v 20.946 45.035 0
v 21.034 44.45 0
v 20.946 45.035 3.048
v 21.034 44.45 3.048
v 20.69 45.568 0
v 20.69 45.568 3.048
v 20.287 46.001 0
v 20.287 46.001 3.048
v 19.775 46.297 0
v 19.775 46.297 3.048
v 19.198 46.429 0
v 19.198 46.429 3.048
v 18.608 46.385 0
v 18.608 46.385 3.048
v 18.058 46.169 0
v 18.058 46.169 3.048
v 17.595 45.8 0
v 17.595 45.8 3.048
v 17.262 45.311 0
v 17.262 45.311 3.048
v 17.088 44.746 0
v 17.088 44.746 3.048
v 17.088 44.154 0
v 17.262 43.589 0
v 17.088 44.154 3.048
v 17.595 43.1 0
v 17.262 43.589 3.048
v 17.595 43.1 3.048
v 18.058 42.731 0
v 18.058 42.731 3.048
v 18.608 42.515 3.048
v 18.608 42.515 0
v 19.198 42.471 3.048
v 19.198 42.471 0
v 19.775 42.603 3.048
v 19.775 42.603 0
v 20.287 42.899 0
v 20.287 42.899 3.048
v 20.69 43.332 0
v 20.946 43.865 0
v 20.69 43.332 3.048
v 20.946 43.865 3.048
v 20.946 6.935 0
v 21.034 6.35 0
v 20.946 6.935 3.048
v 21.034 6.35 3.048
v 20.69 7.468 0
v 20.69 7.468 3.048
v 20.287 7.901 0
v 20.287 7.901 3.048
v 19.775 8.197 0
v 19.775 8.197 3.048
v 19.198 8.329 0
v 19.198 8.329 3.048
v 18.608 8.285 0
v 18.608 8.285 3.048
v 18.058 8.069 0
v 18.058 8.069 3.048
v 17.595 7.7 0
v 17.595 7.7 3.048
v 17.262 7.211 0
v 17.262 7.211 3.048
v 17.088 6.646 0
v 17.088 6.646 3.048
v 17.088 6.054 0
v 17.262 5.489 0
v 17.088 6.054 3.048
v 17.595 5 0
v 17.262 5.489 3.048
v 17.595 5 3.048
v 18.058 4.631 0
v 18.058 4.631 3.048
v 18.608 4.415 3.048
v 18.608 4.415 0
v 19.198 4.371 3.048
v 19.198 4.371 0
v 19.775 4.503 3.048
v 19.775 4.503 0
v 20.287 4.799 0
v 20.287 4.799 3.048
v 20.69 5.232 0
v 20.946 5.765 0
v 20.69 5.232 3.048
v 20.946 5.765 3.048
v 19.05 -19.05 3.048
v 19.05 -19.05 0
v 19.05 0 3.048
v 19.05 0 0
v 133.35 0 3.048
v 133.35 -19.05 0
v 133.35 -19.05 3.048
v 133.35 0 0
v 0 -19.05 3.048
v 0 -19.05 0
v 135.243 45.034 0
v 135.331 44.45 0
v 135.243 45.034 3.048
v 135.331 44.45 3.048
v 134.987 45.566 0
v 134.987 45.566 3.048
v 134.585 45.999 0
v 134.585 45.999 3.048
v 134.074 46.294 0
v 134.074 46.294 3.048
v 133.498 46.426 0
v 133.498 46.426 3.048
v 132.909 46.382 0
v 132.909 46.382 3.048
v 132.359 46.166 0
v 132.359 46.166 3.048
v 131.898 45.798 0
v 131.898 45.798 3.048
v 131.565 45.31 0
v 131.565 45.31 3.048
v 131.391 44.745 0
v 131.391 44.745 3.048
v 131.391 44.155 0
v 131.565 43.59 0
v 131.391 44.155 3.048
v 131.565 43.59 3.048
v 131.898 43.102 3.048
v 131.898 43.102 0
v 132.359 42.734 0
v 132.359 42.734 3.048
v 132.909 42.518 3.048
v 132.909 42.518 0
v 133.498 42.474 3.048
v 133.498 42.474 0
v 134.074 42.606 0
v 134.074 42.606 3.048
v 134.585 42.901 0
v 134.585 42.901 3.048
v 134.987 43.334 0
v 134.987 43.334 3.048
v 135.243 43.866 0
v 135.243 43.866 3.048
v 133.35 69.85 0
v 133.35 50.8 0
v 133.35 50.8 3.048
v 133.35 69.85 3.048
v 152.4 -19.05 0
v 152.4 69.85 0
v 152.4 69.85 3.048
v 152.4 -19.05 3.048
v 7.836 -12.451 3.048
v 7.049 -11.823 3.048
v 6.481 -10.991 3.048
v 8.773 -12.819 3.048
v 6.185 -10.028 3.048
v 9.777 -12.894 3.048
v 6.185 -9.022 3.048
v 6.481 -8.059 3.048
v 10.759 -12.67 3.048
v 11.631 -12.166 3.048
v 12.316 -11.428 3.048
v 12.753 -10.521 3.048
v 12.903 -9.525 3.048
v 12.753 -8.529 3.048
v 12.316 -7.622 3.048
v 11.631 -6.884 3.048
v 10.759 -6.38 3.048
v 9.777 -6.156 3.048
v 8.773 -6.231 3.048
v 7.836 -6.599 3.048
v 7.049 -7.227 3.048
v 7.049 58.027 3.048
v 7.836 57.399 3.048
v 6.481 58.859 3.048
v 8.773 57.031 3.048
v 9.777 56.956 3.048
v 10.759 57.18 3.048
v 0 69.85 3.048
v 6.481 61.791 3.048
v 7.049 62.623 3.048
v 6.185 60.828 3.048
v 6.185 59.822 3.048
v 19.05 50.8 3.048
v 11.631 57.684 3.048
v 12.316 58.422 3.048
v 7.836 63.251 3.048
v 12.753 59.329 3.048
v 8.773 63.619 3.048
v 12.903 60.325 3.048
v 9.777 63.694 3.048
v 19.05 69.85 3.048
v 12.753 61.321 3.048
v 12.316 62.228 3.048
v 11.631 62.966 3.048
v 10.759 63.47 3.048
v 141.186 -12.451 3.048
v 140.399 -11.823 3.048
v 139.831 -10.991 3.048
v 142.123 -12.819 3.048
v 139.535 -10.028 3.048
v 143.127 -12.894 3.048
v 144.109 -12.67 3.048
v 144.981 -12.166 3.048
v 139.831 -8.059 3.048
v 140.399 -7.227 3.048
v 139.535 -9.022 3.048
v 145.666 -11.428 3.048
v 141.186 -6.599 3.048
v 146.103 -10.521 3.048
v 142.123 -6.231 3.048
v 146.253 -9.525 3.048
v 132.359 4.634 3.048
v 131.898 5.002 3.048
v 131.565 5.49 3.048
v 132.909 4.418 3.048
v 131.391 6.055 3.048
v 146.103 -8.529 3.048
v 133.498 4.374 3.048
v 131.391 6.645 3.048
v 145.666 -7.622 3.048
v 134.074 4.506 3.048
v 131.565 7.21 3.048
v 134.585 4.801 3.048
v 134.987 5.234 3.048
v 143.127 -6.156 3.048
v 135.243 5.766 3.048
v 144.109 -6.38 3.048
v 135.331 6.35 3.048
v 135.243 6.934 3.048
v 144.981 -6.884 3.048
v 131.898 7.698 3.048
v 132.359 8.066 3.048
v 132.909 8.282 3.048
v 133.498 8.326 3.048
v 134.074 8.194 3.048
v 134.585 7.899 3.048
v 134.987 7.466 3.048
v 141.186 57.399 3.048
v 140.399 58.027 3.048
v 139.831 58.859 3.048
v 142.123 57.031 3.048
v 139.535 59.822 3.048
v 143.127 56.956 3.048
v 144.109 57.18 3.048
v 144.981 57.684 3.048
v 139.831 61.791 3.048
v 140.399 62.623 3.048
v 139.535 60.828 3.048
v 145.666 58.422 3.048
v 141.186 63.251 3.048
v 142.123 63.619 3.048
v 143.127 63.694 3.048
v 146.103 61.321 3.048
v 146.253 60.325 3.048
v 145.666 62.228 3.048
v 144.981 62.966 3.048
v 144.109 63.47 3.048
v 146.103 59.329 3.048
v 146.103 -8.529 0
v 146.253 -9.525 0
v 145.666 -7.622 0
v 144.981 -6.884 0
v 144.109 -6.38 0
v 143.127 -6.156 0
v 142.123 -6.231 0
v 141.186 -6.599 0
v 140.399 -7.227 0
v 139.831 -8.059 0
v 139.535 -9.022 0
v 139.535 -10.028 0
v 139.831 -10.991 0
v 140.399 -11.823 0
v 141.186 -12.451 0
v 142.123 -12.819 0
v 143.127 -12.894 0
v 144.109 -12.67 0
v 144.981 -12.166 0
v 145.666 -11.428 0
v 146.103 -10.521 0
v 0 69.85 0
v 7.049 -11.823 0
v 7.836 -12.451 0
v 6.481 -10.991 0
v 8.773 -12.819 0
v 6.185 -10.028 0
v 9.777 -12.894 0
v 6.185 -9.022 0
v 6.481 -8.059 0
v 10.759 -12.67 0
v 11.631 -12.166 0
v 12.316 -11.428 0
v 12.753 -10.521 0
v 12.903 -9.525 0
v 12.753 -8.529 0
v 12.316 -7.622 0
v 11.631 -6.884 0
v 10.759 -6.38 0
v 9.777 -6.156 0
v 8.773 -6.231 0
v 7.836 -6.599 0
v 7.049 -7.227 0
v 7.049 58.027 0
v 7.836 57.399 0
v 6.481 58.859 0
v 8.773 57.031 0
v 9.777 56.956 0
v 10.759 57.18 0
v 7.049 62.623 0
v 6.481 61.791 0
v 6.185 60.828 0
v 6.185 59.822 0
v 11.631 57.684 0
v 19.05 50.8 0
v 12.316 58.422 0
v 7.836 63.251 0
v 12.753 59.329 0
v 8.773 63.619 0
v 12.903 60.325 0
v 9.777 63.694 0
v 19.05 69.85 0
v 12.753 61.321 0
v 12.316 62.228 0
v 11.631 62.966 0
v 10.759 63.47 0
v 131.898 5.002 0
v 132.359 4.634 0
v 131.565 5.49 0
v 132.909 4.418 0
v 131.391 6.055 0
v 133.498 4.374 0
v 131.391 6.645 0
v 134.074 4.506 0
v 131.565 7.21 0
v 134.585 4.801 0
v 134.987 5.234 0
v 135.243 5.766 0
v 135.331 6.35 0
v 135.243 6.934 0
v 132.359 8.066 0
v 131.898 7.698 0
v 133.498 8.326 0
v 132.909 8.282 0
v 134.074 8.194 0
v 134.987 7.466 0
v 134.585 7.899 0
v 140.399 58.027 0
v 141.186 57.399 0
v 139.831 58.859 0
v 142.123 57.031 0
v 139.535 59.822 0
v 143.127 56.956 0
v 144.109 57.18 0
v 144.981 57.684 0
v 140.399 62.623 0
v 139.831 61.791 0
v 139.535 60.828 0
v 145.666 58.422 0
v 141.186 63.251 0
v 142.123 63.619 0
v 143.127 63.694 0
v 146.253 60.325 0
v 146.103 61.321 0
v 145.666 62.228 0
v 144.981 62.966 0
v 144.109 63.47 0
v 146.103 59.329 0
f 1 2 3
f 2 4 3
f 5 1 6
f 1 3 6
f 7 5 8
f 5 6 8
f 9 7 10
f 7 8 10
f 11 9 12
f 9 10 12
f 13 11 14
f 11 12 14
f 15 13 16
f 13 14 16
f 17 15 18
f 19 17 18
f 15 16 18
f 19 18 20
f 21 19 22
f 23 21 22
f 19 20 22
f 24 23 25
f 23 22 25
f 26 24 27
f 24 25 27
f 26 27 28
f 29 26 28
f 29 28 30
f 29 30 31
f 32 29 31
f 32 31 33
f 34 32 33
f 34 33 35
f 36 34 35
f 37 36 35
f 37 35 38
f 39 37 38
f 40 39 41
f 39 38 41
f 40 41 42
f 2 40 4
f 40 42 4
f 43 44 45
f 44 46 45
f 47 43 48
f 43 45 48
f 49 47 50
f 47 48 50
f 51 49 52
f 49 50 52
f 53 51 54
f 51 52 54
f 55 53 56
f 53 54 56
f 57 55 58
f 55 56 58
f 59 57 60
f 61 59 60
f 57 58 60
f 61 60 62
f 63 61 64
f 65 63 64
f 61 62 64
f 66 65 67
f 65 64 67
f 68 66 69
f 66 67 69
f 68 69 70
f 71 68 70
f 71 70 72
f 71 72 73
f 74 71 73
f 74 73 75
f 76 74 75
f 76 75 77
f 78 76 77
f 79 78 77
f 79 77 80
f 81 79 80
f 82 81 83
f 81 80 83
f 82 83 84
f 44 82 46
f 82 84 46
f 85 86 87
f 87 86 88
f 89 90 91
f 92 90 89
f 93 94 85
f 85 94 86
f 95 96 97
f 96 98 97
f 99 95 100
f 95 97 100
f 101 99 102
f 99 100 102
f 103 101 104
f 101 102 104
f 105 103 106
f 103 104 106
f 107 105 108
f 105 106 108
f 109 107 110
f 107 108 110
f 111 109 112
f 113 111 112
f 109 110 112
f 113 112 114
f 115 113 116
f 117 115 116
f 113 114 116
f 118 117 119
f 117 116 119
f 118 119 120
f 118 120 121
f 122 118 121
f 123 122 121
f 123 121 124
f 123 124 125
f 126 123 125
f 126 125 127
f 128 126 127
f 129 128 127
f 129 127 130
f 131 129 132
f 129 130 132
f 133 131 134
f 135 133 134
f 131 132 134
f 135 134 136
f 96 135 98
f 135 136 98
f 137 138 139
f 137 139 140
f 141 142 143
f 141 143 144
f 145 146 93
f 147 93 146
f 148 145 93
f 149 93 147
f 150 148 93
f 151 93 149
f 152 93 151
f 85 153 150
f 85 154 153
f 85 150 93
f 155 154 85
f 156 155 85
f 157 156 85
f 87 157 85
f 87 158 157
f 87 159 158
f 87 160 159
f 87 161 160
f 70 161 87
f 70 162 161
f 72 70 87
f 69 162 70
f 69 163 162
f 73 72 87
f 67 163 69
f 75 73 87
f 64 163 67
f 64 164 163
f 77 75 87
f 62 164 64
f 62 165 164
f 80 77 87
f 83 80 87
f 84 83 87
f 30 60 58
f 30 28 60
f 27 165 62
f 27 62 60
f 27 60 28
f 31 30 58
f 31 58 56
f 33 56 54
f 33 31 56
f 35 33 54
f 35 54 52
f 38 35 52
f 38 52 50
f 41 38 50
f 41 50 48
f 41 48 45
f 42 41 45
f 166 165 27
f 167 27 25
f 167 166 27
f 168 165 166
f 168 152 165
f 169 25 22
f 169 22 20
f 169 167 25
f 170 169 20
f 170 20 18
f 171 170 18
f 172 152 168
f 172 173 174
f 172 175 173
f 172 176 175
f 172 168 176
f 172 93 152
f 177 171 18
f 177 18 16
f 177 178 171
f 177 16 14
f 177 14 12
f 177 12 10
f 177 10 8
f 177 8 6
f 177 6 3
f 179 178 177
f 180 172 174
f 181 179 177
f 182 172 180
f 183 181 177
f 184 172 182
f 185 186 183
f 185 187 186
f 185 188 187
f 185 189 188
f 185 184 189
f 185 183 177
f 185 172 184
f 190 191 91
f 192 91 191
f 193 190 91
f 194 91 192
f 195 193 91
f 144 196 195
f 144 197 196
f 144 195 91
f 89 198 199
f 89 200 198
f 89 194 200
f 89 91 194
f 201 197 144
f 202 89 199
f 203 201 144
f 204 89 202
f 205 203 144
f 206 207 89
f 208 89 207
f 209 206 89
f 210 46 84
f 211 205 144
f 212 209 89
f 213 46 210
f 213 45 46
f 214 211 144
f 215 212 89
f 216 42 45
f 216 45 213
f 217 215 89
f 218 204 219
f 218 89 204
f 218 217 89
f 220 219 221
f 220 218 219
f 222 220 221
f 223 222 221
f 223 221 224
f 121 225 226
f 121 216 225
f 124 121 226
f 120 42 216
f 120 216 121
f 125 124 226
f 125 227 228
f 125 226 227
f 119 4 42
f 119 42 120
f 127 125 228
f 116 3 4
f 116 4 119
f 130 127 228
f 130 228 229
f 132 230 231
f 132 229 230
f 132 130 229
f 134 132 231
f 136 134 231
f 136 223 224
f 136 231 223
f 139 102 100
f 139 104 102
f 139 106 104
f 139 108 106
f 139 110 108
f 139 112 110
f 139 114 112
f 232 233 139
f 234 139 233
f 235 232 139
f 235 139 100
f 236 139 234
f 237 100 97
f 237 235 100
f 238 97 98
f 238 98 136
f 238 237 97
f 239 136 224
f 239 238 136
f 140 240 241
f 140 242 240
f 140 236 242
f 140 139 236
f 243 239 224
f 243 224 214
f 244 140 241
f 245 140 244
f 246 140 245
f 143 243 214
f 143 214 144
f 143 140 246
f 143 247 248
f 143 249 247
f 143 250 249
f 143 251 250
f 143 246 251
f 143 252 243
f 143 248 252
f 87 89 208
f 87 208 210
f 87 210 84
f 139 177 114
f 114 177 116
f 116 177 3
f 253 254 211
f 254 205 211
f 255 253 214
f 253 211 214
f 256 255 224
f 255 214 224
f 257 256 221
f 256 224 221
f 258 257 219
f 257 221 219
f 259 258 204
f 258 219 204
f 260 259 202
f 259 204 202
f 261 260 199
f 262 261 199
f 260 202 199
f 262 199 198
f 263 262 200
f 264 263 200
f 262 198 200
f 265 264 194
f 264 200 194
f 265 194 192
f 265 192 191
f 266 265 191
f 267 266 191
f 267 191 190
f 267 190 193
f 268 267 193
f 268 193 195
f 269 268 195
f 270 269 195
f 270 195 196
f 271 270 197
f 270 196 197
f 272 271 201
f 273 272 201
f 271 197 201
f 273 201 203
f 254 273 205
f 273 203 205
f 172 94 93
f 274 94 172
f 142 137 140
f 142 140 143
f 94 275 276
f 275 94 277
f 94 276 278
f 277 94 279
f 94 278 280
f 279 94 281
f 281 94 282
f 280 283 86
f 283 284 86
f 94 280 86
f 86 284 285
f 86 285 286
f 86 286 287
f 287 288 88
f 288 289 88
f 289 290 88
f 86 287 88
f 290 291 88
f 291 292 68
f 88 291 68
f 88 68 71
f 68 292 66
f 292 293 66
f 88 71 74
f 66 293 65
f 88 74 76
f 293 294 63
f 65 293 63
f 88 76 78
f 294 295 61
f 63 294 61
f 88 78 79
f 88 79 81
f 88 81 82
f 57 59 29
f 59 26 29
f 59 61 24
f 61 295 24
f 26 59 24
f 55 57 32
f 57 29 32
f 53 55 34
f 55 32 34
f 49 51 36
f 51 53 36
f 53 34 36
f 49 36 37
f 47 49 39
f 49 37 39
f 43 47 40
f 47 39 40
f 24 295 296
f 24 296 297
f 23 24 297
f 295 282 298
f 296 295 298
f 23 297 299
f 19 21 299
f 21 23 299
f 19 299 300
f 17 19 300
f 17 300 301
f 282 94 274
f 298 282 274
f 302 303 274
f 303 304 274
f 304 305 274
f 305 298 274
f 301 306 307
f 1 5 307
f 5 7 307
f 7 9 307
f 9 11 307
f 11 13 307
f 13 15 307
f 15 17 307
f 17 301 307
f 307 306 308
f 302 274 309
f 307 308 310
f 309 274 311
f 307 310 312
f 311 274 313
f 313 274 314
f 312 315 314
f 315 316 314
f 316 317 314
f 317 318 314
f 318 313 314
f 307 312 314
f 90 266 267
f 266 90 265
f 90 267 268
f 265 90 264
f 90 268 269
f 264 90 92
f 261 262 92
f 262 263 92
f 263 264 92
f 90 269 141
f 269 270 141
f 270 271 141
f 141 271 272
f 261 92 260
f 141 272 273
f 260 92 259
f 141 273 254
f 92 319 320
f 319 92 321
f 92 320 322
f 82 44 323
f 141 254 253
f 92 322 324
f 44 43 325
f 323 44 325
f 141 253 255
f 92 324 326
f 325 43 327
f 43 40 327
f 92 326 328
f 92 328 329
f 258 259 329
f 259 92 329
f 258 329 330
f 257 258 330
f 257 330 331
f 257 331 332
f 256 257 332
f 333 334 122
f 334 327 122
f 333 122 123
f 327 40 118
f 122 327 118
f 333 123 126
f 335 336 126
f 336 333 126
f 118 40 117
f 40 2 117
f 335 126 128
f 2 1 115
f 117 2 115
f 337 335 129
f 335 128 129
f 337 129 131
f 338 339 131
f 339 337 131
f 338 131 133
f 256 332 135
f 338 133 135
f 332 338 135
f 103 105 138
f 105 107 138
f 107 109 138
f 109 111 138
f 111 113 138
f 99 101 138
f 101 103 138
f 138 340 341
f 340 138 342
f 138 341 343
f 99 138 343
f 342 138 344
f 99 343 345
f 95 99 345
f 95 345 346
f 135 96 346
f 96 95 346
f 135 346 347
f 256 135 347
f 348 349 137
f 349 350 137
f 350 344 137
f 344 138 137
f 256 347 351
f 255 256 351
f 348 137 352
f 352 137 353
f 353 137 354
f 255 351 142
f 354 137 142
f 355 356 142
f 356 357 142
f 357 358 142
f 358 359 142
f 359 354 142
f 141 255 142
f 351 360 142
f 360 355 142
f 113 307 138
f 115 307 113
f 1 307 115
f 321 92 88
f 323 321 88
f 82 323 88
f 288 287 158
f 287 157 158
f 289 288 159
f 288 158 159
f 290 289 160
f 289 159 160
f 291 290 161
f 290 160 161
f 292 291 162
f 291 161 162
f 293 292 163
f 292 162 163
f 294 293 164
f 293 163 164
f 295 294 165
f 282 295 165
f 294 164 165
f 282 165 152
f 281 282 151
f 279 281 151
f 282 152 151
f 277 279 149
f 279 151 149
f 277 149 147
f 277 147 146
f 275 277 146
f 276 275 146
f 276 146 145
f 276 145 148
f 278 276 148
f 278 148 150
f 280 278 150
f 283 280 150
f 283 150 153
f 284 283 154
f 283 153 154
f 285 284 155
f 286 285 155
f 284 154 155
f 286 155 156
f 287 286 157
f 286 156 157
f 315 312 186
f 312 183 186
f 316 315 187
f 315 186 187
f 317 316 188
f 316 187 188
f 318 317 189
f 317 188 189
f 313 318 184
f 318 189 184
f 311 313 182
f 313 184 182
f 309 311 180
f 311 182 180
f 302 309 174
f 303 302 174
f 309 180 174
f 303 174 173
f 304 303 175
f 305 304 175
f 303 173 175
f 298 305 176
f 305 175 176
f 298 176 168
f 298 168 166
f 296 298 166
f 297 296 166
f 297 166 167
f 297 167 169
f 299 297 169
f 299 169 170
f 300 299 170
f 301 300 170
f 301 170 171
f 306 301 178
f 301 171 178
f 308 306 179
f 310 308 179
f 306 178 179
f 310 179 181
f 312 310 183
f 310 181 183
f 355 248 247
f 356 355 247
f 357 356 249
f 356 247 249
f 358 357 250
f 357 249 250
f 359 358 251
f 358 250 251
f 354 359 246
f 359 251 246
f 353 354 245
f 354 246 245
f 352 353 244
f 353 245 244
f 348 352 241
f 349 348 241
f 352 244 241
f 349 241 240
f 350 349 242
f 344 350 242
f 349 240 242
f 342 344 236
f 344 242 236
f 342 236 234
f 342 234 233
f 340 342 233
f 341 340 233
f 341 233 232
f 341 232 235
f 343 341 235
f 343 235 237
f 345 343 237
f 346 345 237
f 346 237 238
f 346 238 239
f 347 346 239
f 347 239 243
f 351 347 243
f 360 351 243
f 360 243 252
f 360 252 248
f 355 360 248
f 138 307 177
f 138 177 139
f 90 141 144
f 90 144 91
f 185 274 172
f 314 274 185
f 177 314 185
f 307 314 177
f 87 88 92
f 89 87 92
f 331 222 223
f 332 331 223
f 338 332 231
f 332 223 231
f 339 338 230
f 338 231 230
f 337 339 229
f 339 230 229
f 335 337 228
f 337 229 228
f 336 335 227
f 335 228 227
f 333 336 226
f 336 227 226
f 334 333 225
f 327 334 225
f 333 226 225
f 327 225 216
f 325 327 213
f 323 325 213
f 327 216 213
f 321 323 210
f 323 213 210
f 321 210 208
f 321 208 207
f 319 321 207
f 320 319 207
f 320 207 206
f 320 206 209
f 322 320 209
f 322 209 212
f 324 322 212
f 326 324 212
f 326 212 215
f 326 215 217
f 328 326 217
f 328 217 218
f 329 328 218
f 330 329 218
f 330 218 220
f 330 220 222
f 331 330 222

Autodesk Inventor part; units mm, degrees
ref_plane "YZ Plane" through (0, 0, 0) normal (1, 0, 0) x (0, 1, 0)
ref_plane "XZ Plane" through (0, 0, 0) normal (0, 1, 0) x (-1, 0, 0)
ref_plane "XY Plane" through (0, 0, 0) normal (0, 0, 1) x (1, 0, 0)
sketch "Sketch1" plane through (0, 0, 0) normal (0, 0, 1) x (1, 0, 0)
  line L0 (0, 50.8) -> (0, 0)
  line L1 (152.4, 0) -> (152.4, 0)
  line L2 (19.05, 0) -> (133.35, 0)
  line L3 (152.4, 0) -> (152.4, 50.8)
  line L4 (19.05, 50.8) -> (133.35, 50.8)
  line L5 (0, 50.8) -> (0, 69.85)
  line L6 (0, 69.85) -> (19.05, 69.85)
  line L7 (19.05, 69.85) -> (19.05, 50.8)
  line L8 (0, 0) -> (0, -19.05)
  line L9 (0, -19.05) -> (19.05, -19.05)
  line L10 (19.05, -19.05) -> (19.05, 0)
  line L11 (133.35, 50.8) -> (133.35, 69.85)
  line L12 (133.35, 69.85) -> (152.4, 69.85)
  line L13 (152.4, 69.85) -> (152.4, 50.8)
  line L14 (152.4, 0) -> (152.4, -19.05)
  line L15 (152.4, -19.05) -> (133.35, -19.05)
  line L16 (133.35, -19.05) -> (133.35, 0)
  dimension "d23" = 50.8
  dimension "d26" = 152.4
  dimension "d77" = 19.05
  dimension "d78" = 19.05
  dimension "d79" = 19.05
  dimension "d81" = 19.05
  dimension "d82" = 19.05
  dimension "d83" = 19.05
  dimension "d84" = 19.05
extrude "Plate2" add sketch "Sketch1" along normal blind 3.048
sketch "Sketch8" plane through (0, 0, 3.048) normal (0, 0, 1) x (1, 0, 0)
  line L0 (133.35, 0) -> (19.05, 0) projected
  line L1 (19.05, 50.8) -> (19.05, 0)
  line L2 (19.05, 25.4) -> (19.05, 44.45)
  line L3 (19.05, 25.4) -> (19.05, 6.35)
  circle A0 centre (19.05, 44.45) radius 1.9844
  circle A1 centre (19.05, 6.35) radius 1.9844
  line L4 (152.4, 69.85) -> (152.4, -19.05) projected
  circle A2 centre (133.35, 44.45) radius 1.9812
  circle A3 centre (133.35, 6.35) radius 1.9812
  line L5 (19.05, -19.05) -> (0, -19.05) projected
  line L6 (19.05, 0) -> (19.05, -19.05) projected
  line L7 (133.35, -19.05) -> (133.35, 0) projected
  line L8 (152.4, -19.05) -> (133.35, -19.05) projected
  line L9 (133.35, 69.85) -> (152.4, 69.85) projected
  line L10 (19.05, 69.85) -> (19.05, 50.8) projected
  line L11 (0, 69.85) -> (19.05, 69.85) projected
  circle A4 centre (9.525, 60.325) radius 3.3782
  circle A5 centre (9.525, -9.525) radius 3.3782
  circle A6 centre (142.875, 60.325) radius 3.3782
  circle A7 centre (142.875, -9.525) radius 3.3782
  point P0 (0, 0)
  point P1 (152.4, 0)
  point P2 (152.4, 50.8)
  dimension "d63" = 19.05
  dimension "d64" = 19.05
  dimension "d65" = 3.9688
  dimension "d66" = 3.9688
  dimension "d69" = 3.9624
  dimension "d70" = 3.9624
  dimension "d71" = 19.05
  dimension "d72" = 38.1
  dimension "d73" = 19.05
  dimension "d74" = 6.35
  dimension "d85" = 6.7564
  dimension "d86" = 6.7564
  dimension "d87" = 9.525
  dimension "d88" = 9.525
  dimension "d89" = 9.525
  dimension "d90" = 9.525
  dimension "d92" = 6.7564
  dimension "d93" = 6.7564
  dimension "d94" = 9.525
  dimension "d95" = 9.525
  dimension "d96" = 9.525
  dimension "d97" = 9.525
  dimension "d98" = 6.35
extrude "Cut9" cut sketch "Sketch8" against normal blind 3.048
equation "\"d105\" = Thickness"
equation "\"BendRadius\" = Thickness"
equation "\"BendReliefWidth\" = Thickness"
equation "\"BendReliefDepth\" = 0.5 * Thickness"
equation "\"CornerReliefSize\" = 4 * Thickness"
equation "\"MinimumRemnant\" = 2 * Thickness"
equation "\"TransitionRadius\" = BendRadius"
equation "\"JacobiRadiusSize\" = BendRadius"
equation "\"GapSize\" = Thickness"
equation "\"d10\" = BendRadius"
equation "\"d11\" = BendRadius"
equation "\"Thickness\" = 3.048"
properties part number "Pneumatic Piston Bracket_v1"
